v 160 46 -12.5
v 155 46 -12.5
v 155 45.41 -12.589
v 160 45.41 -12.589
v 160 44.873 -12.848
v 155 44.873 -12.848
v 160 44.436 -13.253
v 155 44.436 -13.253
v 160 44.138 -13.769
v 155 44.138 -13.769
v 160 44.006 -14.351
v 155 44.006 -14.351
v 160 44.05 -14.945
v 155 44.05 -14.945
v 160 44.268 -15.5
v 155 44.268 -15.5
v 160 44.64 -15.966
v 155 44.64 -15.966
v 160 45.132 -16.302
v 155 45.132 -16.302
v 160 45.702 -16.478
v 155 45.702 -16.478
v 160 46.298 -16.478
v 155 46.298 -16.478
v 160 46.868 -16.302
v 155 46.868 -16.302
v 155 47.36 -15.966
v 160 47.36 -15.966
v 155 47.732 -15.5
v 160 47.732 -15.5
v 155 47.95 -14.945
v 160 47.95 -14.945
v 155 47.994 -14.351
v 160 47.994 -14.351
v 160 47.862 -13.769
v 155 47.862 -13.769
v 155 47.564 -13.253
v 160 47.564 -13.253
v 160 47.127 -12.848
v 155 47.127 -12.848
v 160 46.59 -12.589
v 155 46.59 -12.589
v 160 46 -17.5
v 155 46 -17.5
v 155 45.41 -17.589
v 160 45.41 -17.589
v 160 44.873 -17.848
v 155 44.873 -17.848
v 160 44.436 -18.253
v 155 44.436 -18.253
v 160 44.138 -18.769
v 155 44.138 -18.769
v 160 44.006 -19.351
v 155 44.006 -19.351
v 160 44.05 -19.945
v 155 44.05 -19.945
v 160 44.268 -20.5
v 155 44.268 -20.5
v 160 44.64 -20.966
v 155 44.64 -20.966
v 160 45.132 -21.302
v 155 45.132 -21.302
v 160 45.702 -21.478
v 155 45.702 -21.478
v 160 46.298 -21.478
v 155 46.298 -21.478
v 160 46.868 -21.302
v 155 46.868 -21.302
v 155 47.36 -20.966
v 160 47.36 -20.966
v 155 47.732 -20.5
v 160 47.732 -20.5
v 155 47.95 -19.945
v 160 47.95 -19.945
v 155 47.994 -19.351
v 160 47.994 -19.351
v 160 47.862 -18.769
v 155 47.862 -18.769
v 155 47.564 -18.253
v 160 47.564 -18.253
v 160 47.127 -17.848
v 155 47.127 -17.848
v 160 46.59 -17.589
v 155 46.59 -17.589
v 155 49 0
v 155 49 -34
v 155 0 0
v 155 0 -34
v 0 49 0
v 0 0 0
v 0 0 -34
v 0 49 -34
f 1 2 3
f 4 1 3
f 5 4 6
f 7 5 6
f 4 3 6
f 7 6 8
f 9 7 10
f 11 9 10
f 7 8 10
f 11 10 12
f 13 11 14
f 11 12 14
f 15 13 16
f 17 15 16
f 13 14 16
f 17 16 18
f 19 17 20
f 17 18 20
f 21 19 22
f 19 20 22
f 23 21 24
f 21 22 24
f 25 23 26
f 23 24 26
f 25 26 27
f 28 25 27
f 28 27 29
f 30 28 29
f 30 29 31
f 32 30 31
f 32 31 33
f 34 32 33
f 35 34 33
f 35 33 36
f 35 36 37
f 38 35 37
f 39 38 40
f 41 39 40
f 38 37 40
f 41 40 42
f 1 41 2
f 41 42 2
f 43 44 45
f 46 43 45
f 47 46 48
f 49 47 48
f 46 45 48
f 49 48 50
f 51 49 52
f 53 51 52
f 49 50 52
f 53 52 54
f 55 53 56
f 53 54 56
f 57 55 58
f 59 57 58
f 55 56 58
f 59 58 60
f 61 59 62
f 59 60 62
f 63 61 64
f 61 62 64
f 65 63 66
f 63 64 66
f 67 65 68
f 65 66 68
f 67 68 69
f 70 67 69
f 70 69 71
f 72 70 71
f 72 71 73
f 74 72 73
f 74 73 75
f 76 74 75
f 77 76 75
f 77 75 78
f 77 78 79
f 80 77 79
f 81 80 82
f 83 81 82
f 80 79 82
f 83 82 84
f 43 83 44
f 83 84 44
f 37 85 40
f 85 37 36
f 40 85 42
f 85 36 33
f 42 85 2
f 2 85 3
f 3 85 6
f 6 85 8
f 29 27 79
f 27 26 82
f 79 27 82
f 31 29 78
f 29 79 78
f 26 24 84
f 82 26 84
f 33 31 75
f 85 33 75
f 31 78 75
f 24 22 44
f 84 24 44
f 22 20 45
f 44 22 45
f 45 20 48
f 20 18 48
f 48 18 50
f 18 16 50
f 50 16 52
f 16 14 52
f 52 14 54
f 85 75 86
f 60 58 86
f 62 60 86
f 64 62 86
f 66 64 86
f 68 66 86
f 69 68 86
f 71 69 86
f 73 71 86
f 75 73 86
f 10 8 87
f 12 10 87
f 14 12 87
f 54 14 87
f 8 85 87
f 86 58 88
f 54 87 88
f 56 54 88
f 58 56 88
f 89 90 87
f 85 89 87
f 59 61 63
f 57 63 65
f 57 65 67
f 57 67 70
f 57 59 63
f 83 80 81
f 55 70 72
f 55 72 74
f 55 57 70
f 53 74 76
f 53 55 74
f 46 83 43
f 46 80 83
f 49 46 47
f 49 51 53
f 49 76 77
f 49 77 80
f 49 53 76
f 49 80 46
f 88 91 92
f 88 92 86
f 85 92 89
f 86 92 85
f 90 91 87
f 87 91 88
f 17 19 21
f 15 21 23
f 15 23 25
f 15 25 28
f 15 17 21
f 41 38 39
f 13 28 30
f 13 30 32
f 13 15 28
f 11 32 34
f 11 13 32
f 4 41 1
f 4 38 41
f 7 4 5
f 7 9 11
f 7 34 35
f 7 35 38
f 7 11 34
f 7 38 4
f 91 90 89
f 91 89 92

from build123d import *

# Parameters (mm, degrees)
ESQUISSE1_W        = 155
ESQUISSE1_H        = 34
BOSS_EXTRU_1_DEPTH = 49
ESQUISSE2_R        = 2
BOSS_EXTRU_2_DEPTH = 5


with BuildPart() as part:
    # Esquisse1 → Boss.-Extru.1 (new body)
    with BuildSketch(Plane(origin=(0, 0, 0), x_dir=(1, 0, 0), z_dir=(0, 1, 0))):
        with Locations((77.5, 17)):
            Rectangle(ESQUISSE1_W, ESQUISSE1_H)
    extrude(amount=BOSS_EXTRU_1_DEPTH)

    # Esquisse2 → Boss.-Extru.2 (add)
    with BuildSketch(Plane(origin=(155, 0, 0), x_dir=(0, 0, -1), z_dir=(1, 0, 0))):
        with Locations(Location((14.5, 46, 0), (0, 0, 180))):
            Circle(ESQUISSE2_R)
        with Locations(Location((19.5, 46, 0), (0, 0, 180))):
            Circle(ESQUISSE2_R)
    extrude(amount=BOSS_EXTRU_2_DEPTH)


solid = part.part
